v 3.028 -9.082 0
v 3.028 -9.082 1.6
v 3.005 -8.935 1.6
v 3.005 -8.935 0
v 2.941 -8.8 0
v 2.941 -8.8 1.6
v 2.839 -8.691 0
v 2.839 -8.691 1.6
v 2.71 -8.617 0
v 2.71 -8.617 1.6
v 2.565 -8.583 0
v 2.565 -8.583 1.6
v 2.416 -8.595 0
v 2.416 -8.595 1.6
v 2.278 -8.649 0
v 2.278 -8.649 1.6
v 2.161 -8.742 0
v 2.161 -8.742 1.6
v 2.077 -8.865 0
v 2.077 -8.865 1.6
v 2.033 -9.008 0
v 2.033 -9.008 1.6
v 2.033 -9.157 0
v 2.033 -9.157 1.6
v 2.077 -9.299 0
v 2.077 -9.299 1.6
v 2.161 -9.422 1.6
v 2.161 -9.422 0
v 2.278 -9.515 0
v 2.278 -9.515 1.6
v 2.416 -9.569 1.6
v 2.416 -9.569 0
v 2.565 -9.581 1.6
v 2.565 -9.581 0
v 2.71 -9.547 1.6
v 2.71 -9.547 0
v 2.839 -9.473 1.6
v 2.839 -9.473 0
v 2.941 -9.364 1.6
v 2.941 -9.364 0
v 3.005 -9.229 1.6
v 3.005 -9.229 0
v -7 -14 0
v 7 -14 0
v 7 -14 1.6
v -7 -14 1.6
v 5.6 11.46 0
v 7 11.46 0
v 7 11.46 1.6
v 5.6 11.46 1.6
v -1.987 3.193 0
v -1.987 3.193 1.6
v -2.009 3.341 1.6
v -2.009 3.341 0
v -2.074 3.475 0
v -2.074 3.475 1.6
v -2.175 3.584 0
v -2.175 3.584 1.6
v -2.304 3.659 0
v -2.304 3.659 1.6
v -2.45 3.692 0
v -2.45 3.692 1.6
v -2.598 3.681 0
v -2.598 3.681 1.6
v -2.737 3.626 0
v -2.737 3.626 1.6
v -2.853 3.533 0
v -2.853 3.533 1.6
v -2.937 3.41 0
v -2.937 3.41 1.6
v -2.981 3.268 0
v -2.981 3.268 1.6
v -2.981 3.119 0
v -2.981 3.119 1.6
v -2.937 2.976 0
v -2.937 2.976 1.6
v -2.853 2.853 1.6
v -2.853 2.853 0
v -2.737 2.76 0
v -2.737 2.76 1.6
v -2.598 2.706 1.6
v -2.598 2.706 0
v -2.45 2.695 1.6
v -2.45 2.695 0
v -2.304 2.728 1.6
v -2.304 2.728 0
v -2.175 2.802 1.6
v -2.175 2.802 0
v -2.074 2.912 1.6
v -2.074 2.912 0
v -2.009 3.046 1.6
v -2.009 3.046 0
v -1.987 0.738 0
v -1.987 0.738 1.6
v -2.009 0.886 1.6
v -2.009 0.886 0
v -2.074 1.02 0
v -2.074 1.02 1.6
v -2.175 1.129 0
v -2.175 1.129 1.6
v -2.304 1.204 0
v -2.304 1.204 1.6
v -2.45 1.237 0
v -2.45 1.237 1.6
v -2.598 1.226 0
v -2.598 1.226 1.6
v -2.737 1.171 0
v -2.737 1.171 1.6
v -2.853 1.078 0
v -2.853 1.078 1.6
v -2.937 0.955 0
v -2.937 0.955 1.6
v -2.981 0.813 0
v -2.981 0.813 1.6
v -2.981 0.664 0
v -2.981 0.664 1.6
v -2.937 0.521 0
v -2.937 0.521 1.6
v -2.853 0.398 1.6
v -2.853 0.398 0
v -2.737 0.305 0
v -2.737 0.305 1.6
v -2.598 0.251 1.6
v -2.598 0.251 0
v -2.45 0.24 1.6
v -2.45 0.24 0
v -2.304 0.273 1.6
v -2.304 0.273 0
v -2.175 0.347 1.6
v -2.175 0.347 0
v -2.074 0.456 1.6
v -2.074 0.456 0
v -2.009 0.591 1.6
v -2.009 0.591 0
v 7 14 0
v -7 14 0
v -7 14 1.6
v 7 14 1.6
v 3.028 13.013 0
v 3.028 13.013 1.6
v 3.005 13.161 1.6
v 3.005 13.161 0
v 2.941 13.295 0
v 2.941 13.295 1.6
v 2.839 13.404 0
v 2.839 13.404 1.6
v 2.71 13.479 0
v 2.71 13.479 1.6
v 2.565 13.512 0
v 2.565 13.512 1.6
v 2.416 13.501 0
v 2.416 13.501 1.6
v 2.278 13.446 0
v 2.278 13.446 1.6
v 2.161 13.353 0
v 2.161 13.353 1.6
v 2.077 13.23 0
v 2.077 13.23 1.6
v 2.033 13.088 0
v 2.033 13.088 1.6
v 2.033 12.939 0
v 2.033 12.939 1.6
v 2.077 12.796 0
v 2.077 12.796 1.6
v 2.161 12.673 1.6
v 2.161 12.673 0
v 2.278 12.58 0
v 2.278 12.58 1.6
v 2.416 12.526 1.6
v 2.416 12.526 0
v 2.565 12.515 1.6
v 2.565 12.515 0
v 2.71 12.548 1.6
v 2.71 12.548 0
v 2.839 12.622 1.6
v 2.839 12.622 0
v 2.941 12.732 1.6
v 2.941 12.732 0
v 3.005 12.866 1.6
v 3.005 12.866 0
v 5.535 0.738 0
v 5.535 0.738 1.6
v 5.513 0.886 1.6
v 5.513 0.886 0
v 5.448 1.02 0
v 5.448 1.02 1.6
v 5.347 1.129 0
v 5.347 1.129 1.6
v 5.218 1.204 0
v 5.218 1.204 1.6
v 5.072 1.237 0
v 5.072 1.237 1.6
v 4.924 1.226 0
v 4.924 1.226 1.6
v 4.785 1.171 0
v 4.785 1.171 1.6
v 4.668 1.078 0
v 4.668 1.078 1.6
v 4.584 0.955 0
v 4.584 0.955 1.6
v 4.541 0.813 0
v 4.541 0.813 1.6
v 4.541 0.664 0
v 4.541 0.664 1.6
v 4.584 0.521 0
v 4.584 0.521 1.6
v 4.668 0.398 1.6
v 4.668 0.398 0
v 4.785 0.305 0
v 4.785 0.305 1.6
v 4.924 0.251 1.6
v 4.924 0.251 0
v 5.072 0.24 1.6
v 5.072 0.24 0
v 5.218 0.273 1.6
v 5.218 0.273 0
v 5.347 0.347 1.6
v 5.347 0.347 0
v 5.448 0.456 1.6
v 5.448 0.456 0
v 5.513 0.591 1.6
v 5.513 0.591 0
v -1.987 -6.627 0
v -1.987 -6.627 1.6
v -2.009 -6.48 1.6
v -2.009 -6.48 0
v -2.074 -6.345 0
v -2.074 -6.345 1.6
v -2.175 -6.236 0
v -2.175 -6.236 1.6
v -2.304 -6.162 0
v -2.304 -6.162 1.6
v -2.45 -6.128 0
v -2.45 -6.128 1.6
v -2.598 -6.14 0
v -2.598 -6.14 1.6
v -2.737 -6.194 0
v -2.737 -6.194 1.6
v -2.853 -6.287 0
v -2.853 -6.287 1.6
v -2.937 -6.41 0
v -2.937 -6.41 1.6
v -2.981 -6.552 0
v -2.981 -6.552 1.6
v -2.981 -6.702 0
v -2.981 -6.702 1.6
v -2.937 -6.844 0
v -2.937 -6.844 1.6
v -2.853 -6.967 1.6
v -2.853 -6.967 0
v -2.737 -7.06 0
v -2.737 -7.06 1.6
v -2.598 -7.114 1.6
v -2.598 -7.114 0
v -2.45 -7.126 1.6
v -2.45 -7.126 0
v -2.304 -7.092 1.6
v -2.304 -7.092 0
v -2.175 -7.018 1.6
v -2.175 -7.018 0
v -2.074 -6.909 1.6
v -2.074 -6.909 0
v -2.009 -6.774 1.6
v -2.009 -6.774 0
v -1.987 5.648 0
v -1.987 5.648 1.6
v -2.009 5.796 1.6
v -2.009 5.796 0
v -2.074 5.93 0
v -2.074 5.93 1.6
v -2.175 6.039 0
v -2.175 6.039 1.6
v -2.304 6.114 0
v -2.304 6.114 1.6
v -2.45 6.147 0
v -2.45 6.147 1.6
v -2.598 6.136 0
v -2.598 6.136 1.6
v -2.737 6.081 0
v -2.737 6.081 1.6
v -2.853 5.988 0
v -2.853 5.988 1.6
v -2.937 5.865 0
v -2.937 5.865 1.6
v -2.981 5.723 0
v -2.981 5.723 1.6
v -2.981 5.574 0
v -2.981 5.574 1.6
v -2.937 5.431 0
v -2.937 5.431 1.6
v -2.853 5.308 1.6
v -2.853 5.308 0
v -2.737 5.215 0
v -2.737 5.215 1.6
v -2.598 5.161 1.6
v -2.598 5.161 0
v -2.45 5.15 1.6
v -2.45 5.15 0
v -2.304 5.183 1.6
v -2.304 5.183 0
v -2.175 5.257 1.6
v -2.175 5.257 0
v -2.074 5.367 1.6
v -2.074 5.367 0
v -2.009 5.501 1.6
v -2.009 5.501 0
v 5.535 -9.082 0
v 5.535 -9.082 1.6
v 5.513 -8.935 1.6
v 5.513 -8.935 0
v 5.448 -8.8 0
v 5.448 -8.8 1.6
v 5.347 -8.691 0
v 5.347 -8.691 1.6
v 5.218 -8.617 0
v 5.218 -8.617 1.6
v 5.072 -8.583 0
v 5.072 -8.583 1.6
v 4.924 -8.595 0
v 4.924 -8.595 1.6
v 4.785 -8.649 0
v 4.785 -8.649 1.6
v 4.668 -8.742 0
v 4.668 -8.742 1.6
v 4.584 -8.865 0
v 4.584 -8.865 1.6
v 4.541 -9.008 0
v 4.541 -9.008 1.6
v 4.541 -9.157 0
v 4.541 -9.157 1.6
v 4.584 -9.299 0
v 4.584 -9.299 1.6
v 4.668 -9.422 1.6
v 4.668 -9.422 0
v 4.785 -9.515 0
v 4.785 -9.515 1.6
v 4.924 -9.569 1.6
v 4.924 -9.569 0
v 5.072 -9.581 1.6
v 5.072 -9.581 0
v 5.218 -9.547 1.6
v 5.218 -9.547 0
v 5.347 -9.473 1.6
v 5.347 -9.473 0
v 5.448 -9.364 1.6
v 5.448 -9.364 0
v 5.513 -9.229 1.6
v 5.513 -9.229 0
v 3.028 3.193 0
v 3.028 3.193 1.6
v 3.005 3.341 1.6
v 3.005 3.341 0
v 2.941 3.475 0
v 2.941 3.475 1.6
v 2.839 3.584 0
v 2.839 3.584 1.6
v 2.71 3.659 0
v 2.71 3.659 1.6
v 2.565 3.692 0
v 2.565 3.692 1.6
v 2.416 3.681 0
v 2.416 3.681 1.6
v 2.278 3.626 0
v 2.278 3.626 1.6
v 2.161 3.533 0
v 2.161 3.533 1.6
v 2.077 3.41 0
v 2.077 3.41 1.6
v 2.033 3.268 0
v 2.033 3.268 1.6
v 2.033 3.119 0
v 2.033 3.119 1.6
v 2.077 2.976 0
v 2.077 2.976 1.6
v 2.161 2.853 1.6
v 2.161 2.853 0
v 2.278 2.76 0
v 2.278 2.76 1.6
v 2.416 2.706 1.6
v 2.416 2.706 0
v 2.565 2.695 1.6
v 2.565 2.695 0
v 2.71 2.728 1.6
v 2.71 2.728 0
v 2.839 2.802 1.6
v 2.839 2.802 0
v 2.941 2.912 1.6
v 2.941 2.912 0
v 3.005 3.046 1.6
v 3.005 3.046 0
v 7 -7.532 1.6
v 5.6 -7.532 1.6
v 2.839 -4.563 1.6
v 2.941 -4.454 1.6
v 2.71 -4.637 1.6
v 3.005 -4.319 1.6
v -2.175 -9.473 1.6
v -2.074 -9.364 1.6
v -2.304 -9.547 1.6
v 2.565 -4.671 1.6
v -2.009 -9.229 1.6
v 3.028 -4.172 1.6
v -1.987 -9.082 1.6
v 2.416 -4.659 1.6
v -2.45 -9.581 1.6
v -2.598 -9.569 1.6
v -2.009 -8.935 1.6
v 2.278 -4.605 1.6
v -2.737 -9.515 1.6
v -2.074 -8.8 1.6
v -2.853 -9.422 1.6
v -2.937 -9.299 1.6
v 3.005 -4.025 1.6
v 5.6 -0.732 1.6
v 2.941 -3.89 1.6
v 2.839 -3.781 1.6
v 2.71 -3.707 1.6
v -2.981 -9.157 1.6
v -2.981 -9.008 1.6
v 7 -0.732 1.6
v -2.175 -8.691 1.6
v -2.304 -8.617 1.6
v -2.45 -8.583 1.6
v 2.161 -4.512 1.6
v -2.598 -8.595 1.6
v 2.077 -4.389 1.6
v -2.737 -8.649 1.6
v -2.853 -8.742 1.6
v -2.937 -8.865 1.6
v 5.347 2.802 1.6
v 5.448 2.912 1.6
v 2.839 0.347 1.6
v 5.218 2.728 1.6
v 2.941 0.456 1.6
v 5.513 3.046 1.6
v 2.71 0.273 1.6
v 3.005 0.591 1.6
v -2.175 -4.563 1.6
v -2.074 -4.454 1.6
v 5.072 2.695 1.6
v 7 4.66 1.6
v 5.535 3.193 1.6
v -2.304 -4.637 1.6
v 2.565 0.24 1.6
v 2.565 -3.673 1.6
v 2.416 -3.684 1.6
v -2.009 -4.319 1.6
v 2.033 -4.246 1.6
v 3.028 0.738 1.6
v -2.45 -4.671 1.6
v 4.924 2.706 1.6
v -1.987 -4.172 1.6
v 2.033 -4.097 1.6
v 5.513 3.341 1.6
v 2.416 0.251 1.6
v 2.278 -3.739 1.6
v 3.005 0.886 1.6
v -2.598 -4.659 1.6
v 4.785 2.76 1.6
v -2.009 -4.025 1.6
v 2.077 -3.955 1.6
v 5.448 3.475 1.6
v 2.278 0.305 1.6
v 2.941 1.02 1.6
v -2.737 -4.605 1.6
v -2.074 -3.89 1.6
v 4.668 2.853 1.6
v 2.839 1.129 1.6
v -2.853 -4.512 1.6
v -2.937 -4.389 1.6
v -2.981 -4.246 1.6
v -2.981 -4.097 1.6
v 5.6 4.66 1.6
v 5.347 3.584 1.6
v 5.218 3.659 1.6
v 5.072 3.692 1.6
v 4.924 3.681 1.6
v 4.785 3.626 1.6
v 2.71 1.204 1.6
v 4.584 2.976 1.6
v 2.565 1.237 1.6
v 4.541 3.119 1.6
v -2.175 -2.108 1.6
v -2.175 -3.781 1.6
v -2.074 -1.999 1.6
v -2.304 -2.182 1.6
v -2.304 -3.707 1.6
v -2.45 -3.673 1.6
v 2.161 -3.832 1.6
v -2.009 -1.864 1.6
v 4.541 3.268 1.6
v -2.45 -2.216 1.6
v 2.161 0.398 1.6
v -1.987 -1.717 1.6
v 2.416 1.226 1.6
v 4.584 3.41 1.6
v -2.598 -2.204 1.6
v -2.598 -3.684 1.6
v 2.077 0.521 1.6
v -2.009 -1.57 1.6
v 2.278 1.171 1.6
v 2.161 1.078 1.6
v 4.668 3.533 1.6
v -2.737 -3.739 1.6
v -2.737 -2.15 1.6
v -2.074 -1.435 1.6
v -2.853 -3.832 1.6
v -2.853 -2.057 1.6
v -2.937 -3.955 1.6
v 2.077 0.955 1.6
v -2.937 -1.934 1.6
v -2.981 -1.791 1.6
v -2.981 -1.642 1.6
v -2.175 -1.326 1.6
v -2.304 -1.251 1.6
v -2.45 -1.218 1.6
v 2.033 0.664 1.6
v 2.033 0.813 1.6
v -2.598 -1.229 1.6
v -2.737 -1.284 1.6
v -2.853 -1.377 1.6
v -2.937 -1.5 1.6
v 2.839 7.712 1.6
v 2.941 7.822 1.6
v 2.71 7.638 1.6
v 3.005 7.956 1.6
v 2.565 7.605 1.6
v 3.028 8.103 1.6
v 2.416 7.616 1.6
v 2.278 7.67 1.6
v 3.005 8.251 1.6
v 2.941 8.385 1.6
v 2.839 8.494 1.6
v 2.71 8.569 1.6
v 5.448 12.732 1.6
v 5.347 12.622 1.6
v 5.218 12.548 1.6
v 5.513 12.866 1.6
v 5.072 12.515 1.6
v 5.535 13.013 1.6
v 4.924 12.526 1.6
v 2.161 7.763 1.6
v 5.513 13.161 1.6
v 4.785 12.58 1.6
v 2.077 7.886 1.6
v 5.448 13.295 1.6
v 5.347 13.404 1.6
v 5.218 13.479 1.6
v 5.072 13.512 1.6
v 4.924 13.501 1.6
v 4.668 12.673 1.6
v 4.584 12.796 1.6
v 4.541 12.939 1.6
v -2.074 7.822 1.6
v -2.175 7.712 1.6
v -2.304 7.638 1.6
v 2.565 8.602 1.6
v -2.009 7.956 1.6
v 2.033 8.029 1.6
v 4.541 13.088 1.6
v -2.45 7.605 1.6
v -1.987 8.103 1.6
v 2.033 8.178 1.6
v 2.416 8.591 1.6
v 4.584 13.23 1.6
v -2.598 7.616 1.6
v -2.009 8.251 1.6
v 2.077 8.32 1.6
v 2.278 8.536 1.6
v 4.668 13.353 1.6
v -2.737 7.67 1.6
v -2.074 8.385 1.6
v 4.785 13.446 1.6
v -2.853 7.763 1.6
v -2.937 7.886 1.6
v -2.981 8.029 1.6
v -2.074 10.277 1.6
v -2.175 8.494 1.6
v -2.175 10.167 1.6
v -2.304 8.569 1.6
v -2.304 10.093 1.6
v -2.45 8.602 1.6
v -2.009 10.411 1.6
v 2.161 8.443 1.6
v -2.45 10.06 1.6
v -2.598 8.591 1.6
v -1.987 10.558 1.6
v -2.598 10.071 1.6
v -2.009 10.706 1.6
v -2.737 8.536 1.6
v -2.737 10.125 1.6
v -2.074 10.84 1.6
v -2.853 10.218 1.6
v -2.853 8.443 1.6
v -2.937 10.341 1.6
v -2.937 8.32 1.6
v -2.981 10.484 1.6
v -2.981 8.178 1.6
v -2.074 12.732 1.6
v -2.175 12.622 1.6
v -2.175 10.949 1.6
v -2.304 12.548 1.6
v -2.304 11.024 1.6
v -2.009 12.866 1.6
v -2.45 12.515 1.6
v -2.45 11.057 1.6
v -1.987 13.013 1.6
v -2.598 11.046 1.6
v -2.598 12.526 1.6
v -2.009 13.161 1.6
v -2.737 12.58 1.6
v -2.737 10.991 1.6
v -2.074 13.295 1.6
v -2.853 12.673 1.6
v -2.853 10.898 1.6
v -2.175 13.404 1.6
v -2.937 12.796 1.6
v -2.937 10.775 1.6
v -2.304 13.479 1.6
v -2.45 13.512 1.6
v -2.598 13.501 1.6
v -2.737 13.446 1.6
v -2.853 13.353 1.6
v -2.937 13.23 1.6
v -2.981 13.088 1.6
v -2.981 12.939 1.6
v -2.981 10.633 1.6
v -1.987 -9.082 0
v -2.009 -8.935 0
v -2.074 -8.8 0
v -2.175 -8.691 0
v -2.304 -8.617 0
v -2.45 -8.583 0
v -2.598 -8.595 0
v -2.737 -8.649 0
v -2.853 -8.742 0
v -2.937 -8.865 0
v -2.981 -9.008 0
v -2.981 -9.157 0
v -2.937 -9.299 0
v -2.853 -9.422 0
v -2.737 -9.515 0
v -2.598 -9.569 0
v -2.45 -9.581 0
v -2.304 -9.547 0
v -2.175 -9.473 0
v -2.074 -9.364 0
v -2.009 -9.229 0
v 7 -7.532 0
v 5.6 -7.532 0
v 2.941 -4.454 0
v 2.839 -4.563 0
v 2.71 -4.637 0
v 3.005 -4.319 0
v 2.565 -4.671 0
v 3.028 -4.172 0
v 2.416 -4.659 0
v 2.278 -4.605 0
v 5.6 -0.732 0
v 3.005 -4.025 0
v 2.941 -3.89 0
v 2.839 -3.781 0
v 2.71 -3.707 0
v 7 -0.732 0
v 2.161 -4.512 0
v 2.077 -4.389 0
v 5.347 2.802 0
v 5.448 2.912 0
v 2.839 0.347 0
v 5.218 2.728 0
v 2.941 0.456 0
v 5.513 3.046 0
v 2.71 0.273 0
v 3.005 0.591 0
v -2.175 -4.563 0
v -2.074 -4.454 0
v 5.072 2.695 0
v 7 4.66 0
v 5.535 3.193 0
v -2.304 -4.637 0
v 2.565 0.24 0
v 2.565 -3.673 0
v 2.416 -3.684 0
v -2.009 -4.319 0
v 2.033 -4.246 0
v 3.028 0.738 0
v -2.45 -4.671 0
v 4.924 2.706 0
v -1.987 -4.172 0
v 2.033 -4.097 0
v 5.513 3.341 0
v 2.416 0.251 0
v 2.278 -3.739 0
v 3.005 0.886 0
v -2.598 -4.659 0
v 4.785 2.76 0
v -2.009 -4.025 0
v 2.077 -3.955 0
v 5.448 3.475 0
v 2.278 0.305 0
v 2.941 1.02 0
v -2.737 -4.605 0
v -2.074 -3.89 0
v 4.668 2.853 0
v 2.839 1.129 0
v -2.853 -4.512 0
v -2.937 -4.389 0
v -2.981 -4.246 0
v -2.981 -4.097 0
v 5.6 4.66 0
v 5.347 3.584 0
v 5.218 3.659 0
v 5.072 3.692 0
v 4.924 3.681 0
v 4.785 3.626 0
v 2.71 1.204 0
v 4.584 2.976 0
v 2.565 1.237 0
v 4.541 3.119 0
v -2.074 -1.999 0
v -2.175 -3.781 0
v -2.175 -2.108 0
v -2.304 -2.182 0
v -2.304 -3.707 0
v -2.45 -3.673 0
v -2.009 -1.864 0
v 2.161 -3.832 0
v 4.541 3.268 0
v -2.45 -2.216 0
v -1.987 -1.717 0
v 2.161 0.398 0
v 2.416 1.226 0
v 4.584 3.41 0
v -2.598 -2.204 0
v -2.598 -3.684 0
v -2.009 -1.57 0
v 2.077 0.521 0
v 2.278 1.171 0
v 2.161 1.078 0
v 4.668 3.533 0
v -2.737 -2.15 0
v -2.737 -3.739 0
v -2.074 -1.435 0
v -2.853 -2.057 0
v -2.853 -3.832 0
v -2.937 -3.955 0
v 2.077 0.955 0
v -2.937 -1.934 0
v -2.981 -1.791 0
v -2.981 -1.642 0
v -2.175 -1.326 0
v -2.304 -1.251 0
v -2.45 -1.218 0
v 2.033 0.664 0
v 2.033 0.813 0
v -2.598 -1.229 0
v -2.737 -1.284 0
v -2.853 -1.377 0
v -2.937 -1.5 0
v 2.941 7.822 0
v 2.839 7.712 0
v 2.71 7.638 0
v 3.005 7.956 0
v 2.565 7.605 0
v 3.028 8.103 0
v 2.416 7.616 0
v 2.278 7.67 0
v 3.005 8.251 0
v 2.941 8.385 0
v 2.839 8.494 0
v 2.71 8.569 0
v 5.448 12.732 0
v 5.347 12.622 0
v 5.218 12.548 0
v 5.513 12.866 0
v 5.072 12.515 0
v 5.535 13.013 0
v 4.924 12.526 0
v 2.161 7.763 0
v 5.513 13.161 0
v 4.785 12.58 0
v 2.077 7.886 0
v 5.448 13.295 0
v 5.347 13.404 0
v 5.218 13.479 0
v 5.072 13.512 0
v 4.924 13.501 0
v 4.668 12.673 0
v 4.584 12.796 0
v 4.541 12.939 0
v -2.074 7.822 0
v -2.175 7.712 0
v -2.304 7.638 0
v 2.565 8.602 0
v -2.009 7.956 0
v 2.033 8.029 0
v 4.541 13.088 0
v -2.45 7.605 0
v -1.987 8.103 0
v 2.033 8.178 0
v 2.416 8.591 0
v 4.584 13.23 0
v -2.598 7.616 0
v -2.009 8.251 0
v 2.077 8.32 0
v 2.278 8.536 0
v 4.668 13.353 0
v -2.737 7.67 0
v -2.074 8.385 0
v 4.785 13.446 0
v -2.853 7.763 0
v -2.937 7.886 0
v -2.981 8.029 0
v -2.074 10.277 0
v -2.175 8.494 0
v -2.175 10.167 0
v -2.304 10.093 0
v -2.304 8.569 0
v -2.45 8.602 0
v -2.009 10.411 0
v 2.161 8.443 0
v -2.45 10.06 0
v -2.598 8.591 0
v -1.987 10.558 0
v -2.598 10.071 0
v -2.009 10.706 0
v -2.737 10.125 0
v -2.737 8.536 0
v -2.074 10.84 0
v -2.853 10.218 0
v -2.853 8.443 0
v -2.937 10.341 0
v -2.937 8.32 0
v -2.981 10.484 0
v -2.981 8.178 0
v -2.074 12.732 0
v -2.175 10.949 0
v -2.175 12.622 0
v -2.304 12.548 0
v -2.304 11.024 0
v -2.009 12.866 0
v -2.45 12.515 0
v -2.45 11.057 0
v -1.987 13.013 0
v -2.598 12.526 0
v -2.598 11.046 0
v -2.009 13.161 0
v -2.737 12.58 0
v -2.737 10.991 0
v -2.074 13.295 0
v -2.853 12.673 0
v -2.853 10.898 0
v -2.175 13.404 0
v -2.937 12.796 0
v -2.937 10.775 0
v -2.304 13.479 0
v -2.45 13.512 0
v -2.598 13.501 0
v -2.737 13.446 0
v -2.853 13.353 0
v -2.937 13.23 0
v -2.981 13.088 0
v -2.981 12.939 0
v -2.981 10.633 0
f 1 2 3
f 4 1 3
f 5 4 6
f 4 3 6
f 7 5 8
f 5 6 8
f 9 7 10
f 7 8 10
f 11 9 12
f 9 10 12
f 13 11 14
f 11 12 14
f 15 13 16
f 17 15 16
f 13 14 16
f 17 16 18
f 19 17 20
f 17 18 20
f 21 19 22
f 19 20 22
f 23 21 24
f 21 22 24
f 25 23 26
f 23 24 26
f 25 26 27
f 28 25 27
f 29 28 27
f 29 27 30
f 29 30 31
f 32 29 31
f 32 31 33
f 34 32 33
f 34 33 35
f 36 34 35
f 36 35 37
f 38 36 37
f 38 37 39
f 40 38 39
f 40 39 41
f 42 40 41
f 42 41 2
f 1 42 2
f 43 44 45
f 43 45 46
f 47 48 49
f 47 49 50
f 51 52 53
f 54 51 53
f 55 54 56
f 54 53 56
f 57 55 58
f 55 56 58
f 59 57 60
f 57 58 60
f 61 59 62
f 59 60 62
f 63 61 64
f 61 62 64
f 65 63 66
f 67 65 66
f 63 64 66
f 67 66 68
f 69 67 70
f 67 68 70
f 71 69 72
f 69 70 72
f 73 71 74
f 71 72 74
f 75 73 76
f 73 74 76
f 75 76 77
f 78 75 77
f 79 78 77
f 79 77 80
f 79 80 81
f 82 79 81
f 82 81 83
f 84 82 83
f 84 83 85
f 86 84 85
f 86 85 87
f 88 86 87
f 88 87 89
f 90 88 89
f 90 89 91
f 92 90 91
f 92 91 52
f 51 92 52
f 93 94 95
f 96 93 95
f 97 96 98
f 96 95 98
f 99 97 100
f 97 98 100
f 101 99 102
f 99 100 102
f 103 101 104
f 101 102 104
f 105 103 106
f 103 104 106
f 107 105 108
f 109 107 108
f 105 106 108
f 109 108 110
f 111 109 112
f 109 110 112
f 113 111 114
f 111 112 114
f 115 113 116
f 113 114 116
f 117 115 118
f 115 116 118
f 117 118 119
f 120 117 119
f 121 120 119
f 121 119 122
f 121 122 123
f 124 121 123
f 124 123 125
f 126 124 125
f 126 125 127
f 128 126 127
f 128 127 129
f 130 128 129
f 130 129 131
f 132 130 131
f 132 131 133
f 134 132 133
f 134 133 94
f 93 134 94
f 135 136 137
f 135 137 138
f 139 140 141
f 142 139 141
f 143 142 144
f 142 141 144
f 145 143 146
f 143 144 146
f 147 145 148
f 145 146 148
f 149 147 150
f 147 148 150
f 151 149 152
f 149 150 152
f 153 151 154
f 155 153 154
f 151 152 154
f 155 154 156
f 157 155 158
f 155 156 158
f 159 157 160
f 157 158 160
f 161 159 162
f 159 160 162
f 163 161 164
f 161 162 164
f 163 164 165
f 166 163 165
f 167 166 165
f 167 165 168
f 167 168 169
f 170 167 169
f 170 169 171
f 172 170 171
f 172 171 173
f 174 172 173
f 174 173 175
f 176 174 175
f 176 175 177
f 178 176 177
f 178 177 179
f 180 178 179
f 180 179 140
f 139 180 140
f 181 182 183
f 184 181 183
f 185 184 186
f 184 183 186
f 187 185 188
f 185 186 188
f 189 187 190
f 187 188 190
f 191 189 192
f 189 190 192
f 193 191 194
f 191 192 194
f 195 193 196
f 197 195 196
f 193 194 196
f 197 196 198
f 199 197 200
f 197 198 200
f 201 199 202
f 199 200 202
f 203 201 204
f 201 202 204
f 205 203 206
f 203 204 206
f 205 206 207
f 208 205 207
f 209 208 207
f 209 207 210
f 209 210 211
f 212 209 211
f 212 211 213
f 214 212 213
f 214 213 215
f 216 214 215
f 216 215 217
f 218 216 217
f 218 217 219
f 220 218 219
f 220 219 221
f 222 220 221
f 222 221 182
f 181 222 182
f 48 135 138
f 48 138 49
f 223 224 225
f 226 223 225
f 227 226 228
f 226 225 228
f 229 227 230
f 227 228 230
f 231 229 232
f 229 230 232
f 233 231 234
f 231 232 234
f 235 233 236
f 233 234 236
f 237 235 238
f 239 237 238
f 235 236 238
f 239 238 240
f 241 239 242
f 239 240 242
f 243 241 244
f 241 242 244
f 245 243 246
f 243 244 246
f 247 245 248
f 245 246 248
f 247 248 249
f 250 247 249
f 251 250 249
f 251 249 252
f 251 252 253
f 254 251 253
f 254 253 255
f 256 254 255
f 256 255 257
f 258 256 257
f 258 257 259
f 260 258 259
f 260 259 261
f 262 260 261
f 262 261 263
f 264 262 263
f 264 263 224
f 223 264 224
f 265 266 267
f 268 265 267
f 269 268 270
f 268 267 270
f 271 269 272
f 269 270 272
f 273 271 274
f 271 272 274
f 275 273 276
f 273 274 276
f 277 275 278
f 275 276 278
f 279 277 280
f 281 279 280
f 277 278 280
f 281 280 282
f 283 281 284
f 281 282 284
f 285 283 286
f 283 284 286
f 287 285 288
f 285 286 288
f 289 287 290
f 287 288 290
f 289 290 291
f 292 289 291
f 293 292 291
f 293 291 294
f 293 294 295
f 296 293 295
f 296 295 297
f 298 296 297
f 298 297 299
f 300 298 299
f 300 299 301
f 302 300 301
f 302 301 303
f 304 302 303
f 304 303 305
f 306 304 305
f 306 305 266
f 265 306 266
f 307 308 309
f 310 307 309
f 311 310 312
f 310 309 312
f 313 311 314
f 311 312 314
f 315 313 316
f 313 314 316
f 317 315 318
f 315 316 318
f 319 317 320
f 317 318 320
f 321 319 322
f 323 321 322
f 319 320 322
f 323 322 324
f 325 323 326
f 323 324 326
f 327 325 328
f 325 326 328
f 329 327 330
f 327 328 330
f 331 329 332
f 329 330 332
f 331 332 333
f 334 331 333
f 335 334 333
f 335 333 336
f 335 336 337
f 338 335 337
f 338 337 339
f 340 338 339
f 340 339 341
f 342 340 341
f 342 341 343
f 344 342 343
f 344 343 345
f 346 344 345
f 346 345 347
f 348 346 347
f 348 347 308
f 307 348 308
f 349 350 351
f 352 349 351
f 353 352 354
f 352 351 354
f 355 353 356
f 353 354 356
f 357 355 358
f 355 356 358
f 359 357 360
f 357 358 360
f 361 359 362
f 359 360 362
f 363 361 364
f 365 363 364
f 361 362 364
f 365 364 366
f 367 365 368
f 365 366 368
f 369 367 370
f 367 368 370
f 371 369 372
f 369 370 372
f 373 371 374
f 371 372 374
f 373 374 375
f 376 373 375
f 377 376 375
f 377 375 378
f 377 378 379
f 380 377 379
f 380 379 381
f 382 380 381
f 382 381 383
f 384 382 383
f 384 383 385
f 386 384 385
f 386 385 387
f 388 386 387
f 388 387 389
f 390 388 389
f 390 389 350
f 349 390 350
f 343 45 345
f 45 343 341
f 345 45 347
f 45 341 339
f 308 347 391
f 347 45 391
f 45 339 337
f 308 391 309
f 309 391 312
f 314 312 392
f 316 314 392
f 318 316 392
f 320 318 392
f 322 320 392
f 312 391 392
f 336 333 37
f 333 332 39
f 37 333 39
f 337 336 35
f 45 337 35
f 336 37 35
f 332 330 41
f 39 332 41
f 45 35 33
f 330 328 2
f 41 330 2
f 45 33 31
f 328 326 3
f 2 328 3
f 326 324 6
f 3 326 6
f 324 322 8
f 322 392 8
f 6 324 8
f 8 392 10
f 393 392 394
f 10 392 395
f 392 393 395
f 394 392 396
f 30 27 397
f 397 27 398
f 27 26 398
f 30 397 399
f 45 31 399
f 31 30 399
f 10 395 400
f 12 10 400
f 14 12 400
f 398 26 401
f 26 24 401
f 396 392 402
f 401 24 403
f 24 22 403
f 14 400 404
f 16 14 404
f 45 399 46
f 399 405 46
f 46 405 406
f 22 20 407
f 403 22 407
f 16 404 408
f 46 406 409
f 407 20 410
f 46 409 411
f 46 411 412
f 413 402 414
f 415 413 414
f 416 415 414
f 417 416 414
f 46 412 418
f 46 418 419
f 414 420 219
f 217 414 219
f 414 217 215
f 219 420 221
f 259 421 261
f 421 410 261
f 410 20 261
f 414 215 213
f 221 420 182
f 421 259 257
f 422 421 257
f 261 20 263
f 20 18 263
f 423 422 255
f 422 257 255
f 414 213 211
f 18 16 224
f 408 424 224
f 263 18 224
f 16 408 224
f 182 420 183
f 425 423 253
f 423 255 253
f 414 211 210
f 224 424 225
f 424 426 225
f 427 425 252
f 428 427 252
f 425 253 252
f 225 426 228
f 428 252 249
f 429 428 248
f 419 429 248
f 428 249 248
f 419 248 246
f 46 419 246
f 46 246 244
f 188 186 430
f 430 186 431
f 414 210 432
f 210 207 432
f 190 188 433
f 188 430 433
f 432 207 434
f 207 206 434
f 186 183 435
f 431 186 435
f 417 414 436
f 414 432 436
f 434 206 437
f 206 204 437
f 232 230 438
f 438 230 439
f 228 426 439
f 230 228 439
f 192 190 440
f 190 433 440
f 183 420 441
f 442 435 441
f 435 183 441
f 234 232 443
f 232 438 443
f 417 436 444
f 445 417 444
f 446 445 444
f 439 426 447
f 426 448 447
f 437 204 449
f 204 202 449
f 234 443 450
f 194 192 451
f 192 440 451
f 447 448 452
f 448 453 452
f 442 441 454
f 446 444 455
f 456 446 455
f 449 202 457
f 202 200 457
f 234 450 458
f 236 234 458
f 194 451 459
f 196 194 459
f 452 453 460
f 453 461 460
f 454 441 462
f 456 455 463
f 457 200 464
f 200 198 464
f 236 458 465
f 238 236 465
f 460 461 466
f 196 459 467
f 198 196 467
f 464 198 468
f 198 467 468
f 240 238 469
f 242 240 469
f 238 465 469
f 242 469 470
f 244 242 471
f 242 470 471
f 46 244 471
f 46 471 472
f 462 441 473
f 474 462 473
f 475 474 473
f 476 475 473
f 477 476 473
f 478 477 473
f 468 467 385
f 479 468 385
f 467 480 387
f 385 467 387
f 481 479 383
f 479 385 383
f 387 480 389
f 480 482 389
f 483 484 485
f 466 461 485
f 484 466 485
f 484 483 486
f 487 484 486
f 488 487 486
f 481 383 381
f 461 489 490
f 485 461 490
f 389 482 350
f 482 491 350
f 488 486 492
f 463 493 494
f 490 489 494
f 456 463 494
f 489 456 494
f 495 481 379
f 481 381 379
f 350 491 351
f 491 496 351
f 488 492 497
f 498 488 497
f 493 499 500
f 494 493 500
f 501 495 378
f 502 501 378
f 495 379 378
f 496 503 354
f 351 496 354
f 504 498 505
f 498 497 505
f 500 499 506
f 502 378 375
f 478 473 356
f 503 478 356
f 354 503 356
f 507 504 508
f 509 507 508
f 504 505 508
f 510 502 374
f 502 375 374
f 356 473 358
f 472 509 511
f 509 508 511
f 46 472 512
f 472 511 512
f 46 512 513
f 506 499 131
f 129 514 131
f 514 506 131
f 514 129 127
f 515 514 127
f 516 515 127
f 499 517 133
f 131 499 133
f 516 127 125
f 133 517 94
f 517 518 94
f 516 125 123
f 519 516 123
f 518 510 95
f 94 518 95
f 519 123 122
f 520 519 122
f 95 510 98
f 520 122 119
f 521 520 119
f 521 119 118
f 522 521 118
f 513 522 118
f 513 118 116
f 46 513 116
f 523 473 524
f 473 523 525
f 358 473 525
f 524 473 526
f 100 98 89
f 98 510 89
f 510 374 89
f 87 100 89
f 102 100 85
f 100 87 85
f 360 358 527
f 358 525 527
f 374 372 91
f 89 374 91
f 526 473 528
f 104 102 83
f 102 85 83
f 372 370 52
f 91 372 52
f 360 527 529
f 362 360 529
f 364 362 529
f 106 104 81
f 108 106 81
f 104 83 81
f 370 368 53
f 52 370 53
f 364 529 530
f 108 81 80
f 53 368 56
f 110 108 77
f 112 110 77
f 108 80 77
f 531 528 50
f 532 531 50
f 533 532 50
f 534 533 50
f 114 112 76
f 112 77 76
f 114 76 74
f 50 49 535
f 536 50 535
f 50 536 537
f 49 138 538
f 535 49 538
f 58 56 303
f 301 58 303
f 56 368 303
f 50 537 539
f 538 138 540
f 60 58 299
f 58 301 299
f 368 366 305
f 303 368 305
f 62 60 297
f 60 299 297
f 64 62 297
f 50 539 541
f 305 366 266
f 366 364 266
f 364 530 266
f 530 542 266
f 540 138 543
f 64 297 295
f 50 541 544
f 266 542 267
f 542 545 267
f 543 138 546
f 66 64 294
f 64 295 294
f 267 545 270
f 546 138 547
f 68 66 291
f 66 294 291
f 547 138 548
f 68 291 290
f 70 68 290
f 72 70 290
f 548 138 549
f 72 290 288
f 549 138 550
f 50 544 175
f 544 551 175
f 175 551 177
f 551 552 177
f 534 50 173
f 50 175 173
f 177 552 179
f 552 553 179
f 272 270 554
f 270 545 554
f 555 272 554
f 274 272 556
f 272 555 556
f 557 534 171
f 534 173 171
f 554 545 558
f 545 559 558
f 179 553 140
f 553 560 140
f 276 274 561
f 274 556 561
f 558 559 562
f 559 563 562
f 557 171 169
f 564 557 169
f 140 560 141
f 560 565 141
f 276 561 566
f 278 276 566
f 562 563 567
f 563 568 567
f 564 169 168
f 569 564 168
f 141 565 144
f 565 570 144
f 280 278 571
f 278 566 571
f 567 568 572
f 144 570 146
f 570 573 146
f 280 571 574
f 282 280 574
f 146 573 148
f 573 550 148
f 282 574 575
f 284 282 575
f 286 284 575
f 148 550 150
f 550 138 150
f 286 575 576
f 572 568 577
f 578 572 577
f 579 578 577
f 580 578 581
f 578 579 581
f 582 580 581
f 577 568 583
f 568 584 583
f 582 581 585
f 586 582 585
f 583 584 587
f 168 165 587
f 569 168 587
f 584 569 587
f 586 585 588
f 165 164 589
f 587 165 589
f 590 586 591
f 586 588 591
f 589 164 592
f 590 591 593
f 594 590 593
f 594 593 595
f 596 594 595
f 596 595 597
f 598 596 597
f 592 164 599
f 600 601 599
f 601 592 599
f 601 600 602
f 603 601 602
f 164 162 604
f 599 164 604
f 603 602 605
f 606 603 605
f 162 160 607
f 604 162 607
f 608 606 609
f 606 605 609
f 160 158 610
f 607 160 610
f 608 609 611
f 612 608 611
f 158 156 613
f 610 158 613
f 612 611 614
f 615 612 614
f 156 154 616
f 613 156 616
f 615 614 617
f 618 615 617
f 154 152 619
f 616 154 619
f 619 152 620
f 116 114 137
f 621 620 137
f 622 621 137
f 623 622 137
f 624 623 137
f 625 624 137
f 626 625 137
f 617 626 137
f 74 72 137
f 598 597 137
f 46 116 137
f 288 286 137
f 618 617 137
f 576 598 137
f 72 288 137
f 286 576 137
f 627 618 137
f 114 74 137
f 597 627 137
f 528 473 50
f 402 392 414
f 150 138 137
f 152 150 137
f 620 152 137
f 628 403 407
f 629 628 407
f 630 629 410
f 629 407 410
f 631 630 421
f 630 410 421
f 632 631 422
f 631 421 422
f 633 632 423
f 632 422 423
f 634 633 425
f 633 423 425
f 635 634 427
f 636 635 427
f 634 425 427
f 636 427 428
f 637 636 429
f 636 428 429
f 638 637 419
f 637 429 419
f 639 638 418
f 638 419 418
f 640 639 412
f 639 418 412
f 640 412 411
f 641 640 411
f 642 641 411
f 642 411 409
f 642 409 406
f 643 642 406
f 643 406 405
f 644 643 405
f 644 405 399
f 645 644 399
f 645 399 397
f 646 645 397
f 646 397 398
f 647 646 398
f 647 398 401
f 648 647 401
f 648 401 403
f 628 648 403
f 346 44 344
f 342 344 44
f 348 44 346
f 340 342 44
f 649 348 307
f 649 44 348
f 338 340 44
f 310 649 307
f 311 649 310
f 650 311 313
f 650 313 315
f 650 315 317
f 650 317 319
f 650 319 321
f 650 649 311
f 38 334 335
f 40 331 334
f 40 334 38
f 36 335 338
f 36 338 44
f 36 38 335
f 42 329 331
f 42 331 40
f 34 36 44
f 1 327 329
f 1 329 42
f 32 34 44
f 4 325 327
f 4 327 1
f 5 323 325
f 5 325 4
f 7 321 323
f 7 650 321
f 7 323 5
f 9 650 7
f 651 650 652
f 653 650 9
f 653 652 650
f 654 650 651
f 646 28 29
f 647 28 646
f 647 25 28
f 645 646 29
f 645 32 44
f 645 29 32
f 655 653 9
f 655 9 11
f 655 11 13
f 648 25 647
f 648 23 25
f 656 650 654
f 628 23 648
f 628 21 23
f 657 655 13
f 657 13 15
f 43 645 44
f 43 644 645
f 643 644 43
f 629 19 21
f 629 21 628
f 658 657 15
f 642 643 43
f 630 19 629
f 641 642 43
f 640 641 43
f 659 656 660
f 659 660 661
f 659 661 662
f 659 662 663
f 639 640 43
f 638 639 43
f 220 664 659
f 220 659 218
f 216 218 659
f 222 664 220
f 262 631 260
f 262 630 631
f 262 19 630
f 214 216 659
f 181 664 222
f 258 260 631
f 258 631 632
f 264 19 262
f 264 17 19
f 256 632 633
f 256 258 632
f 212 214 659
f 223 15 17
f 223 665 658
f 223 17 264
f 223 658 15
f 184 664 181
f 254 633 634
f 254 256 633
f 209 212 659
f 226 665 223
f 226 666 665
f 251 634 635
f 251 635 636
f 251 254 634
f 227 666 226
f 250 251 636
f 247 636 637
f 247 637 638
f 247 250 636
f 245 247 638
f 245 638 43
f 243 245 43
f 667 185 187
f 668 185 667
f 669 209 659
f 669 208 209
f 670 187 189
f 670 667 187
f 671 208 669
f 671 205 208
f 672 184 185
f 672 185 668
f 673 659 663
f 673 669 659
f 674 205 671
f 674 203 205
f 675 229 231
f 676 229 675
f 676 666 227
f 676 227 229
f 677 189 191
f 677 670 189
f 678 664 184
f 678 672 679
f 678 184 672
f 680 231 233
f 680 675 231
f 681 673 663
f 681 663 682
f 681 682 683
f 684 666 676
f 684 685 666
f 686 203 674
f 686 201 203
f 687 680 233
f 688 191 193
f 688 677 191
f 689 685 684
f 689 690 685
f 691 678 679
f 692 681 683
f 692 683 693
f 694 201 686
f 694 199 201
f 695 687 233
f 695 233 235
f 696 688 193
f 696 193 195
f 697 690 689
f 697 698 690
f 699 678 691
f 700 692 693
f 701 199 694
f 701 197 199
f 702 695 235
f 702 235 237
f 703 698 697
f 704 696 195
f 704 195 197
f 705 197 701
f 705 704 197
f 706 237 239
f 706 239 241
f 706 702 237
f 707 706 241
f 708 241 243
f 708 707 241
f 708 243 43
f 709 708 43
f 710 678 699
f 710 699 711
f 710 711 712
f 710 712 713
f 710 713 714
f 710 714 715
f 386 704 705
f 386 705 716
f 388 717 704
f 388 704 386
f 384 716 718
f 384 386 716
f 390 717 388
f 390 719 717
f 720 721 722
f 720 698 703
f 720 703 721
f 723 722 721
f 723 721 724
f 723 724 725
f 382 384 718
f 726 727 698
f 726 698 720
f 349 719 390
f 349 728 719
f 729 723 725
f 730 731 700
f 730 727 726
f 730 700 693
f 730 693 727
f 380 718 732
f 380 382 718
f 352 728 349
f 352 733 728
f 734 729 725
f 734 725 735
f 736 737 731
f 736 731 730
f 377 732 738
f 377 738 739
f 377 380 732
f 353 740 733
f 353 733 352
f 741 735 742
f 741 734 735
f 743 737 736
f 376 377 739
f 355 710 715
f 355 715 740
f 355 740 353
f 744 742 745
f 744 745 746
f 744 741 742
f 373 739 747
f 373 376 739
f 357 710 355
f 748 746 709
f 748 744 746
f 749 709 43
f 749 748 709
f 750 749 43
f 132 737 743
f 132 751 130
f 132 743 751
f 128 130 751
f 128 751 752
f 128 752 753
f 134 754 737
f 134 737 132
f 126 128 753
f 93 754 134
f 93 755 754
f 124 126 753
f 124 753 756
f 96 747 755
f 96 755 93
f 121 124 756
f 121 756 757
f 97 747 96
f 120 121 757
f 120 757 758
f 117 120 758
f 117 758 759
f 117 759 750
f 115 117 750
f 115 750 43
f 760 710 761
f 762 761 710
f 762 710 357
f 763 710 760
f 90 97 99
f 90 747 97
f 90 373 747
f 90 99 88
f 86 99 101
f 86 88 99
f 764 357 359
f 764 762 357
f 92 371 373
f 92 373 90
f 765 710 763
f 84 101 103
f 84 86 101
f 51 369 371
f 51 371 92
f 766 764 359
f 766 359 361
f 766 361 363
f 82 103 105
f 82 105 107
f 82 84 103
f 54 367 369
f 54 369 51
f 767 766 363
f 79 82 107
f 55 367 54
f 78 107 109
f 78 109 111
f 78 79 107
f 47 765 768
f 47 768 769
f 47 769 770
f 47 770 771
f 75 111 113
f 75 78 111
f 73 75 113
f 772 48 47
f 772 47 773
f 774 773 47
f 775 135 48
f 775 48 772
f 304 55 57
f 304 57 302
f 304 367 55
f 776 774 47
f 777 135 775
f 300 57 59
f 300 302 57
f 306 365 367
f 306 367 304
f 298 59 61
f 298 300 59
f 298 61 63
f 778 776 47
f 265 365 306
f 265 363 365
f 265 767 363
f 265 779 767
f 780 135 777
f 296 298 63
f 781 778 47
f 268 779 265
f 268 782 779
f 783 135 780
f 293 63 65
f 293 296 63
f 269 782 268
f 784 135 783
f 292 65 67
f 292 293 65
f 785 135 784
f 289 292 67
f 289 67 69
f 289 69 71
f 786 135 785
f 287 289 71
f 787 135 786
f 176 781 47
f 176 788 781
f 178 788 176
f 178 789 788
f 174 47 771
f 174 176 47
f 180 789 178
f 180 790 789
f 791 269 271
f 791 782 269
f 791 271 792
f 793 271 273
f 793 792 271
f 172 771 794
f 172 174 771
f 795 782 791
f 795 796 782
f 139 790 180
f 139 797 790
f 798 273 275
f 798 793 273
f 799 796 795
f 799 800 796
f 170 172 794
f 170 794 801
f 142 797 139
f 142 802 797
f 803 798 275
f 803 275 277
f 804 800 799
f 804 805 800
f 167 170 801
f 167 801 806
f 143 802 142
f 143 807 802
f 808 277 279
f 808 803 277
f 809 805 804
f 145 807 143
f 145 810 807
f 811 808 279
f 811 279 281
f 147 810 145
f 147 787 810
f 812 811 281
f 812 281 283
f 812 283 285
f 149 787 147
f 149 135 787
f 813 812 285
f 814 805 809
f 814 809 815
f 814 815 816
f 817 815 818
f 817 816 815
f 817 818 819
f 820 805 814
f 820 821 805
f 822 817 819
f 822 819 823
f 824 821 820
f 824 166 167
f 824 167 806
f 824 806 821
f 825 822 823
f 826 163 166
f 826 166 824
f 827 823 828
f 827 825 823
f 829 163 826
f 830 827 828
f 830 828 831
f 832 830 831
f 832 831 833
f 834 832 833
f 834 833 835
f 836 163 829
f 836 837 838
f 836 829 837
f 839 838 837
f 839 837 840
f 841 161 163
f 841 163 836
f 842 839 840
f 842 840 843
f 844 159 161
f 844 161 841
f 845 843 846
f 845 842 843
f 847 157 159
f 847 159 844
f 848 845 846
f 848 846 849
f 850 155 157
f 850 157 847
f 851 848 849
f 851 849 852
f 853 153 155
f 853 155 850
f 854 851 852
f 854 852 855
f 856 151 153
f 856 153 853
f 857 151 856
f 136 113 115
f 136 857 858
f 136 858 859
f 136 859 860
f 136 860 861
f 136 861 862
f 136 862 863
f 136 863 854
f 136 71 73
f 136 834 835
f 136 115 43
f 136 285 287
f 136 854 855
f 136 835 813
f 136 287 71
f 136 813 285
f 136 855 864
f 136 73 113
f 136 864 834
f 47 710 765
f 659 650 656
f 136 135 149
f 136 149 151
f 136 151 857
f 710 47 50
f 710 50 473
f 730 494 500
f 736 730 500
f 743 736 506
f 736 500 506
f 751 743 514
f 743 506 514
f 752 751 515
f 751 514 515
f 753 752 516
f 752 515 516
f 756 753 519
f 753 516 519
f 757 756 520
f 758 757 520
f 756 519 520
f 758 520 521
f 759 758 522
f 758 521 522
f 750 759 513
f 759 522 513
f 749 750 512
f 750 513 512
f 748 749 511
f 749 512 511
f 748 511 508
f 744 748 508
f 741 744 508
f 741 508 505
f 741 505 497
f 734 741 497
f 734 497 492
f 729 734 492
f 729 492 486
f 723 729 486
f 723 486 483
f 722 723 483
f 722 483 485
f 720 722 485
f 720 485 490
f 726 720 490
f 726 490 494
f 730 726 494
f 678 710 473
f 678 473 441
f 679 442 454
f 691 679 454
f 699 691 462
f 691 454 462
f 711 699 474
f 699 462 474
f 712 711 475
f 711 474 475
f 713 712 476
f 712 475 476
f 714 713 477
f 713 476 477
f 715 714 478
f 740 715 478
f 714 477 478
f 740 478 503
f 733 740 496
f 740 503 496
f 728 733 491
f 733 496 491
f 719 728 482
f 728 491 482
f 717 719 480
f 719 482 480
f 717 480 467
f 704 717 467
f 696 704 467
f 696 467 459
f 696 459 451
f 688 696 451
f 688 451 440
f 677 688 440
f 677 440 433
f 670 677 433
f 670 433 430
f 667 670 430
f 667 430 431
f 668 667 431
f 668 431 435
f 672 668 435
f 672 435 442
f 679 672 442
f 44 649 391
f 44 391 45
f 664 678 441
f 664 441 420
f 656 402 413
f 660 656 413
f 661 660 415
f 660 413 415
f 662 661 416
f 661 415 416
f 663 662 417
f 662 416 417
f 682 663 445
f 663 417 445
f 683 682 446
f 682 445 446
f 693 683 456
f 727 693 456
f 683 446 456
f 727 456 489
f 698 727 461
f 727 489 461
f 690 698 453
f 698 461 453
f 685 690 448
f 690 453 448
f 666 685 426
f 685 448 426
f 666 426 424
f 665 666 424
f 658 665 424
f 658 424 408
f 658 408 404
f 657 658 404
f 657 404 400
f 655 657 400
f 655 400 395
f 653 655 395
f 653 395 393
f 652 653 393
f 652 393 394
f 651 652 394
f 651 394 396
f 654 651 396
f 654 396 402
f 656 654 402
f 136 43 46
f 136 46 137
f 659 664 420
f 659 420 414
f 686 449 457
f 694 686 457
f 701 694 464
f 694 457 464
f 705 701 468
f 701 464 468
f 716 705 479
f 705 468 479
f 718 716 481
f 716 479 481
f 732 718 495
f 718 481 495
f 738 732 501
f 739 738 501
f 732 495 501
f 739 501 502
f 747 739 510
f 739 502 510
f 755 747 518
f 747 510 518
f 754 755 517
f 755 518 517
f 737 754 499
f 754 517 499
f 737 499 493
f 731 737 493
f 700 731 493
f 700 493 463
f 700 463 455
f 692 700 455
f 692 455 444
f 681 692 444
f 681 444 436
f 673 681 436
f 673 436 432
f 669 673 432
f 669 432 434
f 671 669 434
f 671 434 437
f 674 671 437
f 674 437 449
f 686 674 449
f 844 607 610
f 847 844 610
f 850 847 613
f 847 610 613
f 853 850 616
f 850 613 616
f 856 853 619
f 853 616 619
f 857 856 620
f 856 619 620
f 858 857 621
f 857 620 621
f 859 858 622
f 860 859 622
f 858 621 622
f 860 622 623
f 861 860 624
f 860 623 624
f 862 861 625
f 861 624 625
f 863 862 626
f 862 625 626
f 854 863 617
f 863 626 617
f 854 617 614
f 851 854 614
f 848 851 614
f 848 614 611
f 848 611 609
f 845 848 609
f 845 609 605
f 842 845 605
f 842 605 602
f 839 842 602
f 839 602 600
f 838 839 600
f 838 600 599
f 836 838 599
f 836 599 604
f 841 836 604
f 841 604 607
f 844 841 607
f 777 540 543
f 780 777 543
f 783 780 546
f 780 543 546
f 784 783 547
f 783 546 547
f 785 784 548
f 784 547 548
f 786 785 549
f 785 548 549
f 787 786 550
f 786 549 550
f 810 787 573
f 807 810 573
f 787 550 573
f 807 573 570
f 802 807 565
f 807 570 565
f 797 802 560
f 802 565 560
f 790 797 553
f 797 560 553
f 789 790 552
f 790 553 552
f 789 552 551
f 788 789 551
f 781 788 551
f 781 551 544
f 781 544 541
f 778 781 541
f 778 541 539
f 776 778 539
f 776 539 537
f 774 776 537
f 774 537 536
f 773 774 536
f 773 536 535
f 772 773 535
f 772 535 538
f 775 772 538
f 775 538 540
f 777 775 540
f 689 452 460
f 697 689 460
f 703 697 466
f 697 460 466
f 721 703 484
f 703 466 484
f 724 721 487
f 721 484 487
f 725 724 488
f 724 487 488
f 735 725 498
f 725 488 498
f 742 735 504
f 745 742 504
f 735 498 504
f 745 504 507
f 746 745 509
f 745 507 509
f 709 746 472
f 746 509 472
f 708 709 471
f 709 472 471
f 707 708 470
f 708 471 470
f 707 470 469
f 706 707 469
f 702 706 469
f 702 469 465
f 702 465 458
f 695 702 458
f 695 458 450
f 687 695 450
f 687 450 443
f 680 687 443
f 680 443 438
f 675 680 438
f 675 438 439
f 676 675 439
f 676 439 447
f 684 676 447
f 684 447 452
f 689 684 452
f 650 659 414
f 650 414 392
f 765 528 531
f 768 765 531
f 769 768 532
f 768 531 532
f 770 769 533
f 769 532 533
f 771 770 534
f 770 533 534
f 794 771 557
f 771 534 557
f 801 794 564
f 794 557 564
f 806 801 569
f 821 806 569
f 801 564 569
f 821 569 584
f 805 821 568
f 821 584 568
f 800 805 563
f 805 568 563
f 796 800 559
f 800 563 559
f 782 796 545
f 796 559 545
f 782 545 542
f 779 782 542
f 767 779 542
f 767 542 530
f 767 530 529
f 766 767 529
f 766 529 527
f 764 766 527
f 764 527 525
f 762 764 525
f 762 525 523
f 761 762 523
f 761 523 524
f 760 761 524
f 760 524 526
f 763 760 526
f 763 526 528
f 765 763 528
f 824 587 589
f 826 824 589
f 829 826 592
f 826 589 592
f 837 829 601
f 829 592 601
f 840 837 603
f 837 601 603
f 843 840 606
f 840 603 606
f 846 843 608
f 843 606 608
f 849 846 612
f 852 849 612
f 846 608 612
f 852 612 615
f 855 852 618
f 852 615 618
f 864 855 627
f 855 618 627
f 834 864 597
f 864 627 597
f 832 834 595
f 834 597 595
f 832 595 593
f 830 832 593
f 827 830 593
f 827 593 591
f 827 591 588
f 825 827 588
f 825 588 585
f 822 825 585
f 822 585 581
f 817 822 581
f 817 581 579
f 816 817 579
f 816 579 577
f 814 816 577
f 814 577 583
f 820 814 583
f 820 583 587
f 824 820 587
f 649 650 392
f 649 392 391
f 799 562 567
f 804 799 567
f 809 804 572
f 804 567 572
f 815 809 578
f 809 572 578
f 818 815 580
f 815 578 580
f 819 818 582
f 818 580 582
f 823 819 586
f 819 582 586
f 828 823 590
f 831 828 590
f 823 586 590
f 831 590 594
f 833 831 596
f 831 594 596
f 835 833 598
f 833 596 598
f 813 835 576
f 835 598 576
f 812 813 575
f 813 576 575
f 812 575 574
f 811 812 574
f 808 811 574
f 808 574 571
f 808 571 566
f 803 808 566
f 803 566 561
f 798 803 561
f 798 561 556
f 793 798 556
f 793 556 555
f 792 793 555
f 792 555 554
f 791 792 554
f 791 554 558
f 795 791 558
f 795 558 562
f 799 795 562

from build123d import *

# Parameters (mm, degrees)
BOSS_EXTRUDE1_DEPTH = 1.6
SKETCH2_R           = 0.5
CUT_EXTRUDE1_DEPTH  = 16.734039532


with BuildPart() as part:
    # Sketch1 → Boss-Extrude1 (new body)
    with BuildSketch(Plane.XY):
        Polygon((7, 11.46), (5.6, 11.46), (5.6, 4.66), (7, 4.66), (7, -0.732), (5.6, -0.732), (5.6, -7.532), (7, -7.532), (7, -14), (-7, -14), (-7, 14), (7, 14), align=None)
    extrude(amount=BOSS_EXTRUDE1_DEPTH)

    # Sketch2 → Cut-Extrude1 (cut, through all)
    with BuildSketch(Plane.XY.offset(1.6)):
        with Locations((-2.486935959, 13.013337482)):
            Circle(SKETCH2_R)
        with Locations((-2.486935959, 10.558296047)):
            Circle(SKETCH2_R)
        with Locations((-2.486935959, 8.103254612)):
            Circle(SKETCH2_R)
        with Locations((-2.486935959, 5.648213177)):
            Circle(SKETCH2_R)
        with Locations((-2.486935959, 3.193171742)):
            Circle(SKETCH2_R)
        with Locations((-2.486935959, 0.738130307)):
            Circle(SKETCH2_R)
        with Locations((-2.486935959, -1.716911128)):
            Circle(SKETCH2_R)
        with Locations((-2.486935959, -6.626993998)):
            Circle(SKETCH2_R)
        with Locations((-2.486935959, -9.082035433)):
            Circle(SKETCH2_R)
        with Locations((2.527644678, -4.171952563)):
            Circle(SKETCH2_R)
        with Locations((2.527644678, 8.103254612)):
            Circle(SKETCH2_R)
        with Locations((-2.486935959, -4.171952563)):
            Circle(SKETCH2_R)
        with Locations((2.527644678, 0.738130307)):
            Circle(SKETCH2_R)
        with Locations((2.527644678, 3.193171742)):
            Circle(SKETCH2_R)
        with Locations((5.034934997, 3.193171742)):
            Circle(SKETCH2_R)
        with Locations((5.034934997, 0.738130307)):
            Circle(SKETCH2_R)
        with Locations((2.527644678, 13.013337482)):
            Circle(SKETCH2_R)
        with Locations((5.034934997, 13.013337482)):
            Circle(SKETCH2_R)
        with Locations((5.034934997, -9.082035433)):
            Circle(SKETCH2_R)
        with Locations((2.527644678, -9.082035433)):
            Circle(SKETCH2_R)
    extrude(amount=-CUT_EXTRUDE1_DEPTH, mode=Mode.SUBTRACT)


solid = part.part
